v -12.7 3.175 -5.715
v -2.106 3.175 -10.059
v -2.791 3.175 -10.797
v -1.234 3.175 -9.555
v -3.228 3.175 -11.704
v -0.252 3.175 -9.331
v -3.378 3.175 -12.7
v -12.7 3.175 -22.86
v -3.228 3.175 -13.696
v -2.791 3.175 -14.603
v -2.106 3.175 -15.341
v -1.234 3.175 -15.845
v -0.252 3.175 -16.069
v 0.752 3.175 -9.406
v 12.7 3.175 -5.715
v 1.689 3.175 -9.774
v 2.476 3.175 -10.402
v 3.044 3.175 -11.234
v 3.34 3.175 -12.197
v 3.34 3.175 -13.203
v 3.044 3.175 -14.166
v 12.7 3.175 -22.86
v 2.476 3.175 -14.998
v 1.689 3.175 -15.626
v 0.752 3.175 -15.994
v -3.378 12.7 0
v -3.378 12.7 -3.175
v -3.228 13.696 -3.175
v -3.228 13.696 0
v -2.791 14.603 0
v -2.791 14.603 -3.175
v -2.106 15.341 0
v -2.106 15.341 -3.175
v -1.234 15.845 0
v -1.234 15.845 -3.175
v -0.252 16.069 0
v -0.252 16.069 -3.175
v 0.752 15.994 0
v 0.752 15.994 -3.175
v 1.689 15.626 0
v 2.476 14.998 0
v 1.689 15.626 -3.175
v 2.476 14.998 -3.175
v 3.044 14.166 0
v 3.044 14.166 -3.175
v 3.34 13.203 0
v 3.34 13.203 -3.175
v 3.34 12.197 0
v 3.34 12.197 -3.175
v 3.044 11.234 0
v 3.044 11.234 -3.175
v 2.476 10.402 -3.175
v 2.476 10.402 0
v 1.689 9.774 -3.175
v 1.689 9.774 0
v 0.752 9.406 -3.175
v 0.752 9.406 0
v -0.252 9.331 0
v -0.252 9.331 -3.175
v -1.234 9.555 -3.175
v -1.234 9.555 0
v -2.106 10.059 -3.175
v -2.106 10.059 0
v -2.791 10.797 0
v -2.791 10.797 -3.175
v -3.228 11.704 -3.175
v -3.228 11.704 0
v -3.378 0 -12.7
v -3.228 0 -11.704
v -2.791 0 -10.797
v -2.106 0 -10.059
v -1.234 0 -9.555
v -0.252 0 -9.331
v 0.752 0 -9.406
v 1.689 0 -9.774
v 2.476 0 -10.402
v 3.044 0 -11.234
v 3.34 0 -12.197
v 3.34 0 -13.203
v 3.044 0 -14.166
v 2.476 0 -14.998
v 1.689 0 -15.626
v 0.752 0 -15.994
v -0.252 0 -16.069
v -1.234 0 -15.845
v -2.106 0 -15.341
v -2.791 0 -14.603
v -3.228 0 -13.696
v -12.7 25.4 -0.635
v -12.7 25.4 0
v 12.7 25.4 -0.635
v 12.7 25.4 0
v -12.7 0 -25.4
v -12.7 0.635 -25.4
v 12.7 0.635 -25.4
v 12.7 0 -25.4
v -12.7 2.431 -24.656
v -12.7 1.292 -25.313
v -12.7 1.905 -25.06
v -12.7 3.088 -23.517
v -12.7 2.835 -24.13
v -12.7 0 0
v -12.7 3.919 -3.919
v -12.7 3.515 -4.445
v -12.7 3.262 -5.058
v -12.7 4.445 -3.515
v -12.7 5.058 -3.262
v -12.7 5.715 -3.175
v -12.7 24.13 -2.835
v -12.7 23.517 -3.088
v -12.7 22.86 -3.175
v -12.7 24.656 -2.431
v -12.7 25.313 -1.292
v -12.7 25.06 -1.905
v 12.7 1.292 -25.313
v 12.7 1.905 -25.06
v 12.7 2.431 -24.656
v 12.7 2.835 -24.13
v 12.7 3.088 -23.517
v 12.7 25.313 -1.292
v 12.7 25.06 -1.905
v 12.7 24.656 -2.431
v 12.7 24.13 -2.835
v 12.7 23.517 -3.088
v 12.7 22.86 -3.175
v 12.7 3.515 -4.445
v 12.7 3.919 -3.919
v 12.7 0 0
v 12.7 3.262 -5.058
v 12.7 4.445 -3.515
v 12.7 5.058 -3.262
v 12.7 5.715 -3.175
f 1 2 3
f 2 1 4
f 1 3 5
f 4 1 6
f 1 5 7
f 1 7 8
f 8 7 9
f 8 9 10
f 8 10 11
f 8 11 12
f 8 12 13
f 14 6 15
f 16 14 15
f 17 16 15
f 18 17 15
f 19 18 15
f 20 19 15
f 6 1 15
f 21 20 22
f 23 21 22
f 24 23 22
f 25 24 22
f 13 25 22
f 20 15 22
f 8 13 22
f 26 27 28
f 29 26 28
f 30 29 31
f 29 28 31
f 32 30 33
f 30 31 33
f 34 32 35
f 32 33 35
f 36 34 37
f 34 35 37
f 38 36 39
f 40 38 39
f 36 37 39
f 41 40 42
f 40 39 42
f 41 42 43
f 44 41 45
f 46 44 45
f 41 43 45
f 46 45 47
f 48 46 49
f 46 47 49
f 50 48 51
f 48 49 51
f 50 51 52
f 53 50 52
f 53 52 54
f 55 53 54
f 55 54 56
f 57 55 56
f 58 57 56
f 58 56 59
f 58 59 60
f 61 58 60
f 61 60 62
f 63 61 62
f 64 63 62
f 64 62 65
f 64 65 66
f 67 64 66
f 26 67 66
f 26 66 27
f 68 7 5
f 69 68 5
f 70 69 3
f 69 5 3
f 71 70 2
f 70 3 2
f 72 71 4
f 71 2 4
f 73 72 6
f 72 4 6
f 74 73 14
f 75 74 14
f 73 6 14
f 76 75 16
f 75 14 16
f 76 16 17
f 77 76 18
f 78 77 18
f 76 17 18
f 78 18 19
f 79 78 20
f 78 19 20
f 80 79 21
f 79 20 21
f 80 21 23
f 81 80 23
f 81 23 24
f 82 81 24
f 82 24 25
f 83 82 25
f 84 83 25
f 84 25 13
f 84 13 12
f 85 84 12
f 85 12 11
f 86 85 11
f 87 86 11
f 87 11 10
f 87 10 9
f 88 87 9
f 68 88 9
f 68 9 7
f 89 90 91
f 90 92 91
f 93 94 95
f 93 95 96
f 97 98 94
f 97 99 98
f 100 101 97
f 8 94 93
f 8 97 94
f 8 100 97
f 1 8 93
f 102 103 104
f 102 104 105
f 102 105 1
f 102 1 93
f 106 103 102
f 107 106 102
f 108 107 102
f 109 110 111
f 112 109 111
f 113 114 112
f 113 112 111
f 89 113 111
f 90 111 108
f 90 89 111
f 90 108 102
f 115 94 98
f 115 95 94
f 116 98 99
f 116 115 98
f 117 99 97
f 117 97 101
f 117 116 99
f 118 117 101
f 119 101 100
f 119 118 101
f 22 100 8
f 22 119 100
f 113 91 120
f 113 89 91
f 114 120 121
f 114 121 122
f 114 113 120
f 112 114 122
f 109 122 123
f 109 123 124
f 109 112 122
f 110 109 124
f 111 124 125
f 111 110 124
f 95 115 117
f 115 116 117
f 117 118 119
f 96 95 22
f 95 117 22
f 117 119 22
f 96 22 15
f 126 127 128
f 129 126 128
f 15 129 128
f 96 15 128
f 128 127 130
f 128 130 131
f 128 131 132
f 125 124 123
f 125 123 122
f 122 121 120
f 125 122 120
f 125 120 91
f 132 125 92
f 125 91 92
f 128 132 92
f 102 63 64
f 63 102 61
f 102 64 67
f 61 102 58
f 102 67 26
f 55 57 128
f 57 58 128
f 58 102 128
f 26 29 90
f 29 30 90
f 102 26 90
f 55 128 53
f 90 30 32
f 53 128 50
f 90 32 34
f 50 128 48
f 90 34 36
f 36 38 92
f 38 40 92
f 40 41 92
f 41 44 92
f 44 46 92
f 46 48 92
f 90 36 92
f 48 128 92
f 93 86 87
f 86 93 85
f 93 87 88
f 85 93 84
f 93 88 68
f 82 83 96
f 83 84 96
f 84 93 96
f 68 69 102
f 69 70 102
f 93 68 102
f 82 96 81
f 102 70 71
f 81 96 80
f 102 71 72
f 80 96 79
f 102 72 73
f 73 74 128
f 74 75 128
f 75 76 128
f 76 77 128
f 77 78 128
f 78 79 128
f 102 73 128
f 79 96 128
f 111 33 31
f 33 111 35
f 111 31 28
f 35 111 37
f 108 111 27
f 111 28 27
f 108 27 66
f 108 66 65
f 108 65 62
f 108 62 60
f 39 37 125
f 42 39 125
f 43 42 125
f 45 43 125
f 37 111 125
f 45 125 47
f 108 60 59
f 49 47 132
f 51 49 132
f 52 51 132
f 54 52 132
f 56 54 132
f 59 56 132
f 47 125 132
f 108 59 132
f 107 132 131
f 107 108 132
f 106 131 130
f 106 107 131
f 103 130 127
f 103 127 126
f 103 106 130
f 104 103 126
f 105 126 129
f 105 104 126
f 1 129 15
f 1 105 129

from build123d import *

# Parameters (mm, degrees)
EXTRUDE1_DEPTH          = 12.7
F_1_4_CLEARANCE_HOLE1_D = 6.7564
F_1_4_CLEARANCE_HOLE2_D = 6.7564
FILLET1_R               = 2.54


with BuildPart() as part:
    # Sketch1 → Extrude1 (new, symmetric)
    with BuildSketch(Plane(origin=(0, 0, 0), x_dir=(0, 0, -1), z_dir=(1, 0, 0))):
        Polygon((0, 0), (0, 25.4), (3.175, 25.4), (3.175, 3.175), (25.4, 3.175), (25.4, 0), align=None)
    extrude(amount=EXTRUDE1_DEPTH, both=True)

    # 1/4 Clearance Hole1 (through all)
    with Locations(Plane.XY):
        with Locations((0, 12.7)):
            Hole(F_1_4_CLEARANCE_HOLE1_D / 2)

    # 1/4 Clearance Hole2 (through all)
    with Locations(Plane.XZ):
        with Locations((0, -12.7)):
            Hole(F_1_4_CLEARANCE_HOLE2_D / 2)

    # Fillet1
    fillet1_edges = [part.edges().sort_by_distance(p)[0] for p in [
        (0, 25.4, -3.175),
        (0, 3.175, -3.175),
        (0, 3.175, -25.4),
    ]]
    fillet(fillet1_edges, radius=FILLET1_R)


solid = part.part
